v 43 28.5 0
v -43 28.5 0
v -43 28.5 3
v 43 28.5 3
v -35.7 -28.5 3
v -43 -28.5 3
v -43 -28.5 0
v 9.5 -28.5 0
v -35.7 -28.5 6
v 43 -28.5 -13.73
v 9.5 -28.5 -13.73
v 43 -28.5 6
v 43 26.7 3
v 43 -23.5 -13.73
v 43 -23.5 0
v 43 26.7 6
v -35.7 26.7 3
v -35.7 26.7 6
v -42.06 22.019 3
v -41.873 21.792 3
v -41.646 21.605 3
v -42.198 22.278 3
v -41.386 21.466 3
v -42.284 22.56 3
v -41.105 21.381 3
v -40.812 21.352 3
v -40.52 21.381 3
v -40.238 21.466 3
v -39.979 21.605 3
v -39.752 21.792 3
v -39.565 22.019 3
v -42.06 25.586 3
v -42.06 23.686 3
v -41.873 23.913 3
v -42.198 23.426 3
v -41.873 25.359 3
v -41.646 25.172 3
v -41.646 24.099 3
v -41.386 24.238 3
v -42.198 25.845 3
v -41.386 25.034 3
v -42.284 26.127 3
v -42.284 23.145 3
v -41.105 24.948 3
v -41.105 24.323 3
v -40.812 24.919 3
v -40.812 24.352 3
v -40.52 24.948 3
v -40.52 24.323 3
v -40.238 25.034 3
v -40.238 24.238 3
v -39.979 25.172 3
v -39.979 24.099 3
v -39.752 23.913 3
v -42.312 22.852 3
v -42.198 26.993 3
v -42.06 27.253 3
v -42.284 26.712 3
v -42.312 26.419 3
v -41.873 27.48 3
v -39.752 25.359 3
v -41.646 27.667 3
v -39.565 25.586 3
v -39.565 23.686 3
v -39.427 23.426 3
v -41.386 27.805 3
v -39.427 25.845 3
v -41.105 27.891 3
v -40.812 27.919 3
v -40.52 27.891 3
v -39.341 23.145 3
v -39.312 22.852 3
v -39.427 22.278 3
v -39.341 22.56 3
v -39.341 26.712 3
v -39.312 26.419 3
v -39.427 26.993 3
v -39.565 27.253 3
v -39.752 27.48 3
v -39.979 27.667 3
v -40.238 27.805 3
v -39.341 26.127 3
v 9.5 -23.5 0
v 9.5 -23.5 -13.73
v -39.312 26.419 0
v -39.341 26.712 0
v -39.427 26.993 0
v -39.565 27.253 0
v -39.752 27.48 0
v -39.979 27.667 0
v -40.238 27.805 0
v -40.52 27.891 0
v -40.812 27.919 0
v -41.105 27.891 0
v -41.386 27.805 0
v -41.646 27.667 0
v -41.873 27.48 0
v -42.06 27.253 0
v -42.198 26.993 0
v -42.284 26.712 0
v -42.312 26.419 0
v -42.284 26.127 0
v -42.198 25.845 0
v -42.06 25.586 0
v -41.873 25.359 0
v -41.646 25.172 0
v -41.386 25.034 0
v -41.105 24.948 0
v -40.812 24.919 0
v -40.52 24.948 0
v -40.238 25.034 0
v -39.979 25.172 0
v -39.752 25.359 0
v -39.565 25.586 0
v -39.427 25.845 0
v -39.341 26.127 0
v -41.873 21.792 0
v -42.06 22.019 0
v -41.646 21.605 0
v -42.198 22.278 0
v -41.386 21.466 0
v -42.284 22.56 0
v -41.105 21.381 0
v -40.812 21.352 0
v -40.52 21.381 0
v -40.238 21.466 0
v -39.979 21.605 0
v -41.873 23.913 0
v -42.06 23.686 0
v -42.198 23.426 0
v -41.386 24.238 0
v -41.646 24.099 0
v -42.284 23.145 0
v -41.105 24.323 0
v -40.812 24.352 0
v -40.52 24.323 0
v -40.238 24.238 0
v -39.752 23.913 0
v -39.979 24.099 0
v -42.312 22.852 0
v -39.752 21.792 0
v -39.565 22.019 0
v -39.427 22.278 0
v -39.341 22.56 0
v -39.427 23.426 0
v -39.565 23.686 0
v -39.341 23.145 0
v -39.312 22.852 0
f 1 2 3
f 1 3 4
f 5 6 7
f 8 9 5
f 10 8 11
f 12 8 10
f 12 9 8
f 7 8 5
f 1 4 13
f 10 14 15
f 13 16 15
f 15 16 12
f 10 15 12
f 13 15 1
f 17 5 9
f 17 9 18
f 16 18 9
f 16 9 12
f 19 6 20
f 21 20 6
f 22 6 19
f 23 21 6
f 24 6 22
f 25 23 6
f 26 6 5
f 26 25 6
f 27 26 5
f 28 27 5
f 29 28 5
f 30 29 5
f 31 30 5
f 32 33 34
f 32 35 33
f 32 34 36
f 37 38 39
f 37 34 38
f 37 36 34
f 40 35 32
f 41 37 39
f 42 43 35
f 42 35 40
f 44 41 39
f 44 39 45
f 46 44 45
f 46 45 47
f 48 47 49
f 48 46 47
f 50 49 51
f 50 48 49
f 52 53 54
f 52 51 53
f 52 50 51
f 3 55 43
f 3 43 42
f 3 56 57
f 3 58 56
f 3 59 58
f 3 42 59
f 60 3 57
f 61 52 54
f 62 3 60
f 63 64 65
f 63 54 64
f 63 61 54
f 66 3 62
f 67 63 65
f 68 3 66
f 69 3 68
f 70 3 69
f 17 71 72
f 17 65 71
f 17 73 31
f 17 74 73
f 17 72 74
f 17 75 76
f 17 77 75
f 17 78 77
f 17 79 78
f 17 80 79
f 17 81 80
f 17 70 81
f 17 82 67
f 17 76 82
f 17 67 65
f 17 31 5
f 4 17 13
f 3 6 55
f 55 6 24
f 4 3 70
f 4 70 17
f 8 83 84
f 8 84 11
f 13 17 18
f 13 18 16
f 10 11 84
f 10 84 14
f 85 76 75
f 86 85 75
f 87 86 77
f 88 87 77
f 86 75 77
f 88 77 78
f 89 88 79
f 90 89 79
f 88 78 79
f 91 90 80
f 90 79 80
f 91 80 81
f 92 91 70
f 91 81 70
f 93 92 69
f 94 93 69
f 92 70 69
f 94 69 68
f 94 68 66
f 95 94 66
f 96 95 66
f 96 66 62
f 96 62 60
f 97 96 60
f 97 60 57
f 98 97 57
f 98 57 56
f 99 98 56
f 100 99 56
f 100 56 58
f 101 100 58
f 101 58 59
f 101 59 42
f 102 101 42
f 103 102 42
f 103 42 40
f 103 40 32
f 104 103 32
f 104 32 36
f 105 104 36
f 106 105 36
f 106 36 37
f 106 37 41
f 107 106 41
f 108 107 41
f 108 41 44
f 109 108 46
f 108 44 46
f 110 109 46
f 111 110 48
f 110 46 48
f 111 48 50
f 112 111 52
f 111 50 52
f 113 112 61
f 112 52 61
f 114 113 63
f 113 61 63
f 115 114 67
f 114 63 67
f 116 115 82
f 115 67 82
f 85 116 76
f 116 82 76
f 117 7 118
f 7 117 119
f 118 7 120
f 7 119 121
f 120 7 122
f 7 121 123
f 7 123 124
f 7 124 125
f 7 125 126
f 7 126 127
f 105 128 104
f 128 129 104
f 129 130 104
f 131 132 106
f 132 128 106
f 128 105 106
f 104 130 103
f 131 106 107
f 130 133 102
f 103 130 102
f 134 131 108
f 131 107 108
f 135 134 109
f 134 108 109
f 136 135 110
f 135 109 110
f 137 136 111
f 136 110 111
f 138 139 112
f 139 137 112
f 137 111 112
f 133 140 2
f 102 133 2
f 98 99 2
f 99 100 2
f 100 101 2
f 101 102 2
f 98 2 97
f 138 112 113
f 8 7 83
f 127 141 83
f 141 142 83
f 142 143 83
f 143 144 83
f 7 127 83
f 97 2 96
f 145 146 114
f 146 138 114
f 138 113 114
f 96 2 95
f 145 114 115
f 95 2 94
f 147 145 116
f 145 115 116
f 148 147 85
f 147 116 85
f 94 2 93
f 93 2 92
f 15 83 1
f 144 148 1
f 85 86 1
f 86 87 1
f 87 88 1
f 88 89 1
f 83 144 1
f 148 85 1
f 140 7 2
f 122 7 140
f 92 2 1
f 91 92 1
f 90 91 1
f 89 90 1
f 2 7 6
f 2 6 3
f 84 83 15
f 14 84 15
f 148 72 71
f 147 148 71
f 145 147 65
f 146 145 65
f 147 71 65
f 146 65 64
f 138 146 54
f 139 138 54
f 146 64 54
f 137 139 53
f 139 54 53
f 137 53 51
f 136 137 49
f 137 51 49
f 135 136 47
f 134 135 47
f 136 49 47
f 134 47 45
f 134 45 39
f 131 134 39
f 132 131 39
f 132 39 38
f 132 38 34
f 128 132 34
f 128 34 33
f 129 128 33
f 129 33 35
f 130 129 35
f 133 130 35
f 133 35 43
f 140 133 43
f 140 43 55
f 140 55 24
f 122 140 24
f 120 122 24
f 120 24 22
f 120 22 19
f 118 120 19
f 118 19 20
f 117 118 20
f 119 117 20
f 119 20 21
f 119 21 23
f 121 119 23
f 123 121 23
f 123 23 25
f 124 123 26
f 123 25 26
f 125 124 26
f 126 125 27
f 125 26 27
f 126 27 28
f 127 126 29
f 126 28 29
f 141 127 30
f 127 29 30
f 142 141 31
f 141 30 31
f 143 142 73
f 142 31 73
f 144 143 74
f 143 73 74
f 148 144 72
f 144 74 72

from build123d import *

# Parameters (mm, degrees)
F0_W     = 86
F0_H     = 57
F1_DEPTH = 3
F2_W     = 78.7
F2_H     = 55.2
F3_DEPTH = 3
F4_R     = 1.5
F5_DEPTH = 25
F6_W     = 33.5
F6_H     = 5
F7_DEPTH = 13.73


with BuildPart() as f1:
    # F0 (on Top) → F1 (new body)
    with BuildSketch(Plane.XY):
        Rectangle(F0_W, F0_H)
    extrude(amount=F1_DEPTH)

    # F2 (on face) → F3 (join)
    with BuildSketch(Plane.XY.offset(3)):
        with Locations((3.65, -0.9)):
            Rectangle(F2_W, F2_H)
    extrude(amount=F3_DEPTH)

    # F4 (on face) → F5 (cut)
    with BuildSketch(Plane.XY.offset(3)):
        with Locations((-40.812388, 26.41947)):
            Circle(F4_R)
        with Locations((-40.812388, 22.852236)):
            Circle(F4_R)
    extrude(amount=-F5_DEPTH, mode=Mode.SUBTRACT)

    # F6 (on face) → F7 (join)
    with BuildSketch(Plane(origin=(0, 0, 0), x_dir=(1, 0, 0), z_dir=(0, 0, -1))):
        with Locations((26.25, 26)):
            Rectangle(F6_W, F6_H)
    extrude(amount=F7_DEPTH)


solid = f1.part
